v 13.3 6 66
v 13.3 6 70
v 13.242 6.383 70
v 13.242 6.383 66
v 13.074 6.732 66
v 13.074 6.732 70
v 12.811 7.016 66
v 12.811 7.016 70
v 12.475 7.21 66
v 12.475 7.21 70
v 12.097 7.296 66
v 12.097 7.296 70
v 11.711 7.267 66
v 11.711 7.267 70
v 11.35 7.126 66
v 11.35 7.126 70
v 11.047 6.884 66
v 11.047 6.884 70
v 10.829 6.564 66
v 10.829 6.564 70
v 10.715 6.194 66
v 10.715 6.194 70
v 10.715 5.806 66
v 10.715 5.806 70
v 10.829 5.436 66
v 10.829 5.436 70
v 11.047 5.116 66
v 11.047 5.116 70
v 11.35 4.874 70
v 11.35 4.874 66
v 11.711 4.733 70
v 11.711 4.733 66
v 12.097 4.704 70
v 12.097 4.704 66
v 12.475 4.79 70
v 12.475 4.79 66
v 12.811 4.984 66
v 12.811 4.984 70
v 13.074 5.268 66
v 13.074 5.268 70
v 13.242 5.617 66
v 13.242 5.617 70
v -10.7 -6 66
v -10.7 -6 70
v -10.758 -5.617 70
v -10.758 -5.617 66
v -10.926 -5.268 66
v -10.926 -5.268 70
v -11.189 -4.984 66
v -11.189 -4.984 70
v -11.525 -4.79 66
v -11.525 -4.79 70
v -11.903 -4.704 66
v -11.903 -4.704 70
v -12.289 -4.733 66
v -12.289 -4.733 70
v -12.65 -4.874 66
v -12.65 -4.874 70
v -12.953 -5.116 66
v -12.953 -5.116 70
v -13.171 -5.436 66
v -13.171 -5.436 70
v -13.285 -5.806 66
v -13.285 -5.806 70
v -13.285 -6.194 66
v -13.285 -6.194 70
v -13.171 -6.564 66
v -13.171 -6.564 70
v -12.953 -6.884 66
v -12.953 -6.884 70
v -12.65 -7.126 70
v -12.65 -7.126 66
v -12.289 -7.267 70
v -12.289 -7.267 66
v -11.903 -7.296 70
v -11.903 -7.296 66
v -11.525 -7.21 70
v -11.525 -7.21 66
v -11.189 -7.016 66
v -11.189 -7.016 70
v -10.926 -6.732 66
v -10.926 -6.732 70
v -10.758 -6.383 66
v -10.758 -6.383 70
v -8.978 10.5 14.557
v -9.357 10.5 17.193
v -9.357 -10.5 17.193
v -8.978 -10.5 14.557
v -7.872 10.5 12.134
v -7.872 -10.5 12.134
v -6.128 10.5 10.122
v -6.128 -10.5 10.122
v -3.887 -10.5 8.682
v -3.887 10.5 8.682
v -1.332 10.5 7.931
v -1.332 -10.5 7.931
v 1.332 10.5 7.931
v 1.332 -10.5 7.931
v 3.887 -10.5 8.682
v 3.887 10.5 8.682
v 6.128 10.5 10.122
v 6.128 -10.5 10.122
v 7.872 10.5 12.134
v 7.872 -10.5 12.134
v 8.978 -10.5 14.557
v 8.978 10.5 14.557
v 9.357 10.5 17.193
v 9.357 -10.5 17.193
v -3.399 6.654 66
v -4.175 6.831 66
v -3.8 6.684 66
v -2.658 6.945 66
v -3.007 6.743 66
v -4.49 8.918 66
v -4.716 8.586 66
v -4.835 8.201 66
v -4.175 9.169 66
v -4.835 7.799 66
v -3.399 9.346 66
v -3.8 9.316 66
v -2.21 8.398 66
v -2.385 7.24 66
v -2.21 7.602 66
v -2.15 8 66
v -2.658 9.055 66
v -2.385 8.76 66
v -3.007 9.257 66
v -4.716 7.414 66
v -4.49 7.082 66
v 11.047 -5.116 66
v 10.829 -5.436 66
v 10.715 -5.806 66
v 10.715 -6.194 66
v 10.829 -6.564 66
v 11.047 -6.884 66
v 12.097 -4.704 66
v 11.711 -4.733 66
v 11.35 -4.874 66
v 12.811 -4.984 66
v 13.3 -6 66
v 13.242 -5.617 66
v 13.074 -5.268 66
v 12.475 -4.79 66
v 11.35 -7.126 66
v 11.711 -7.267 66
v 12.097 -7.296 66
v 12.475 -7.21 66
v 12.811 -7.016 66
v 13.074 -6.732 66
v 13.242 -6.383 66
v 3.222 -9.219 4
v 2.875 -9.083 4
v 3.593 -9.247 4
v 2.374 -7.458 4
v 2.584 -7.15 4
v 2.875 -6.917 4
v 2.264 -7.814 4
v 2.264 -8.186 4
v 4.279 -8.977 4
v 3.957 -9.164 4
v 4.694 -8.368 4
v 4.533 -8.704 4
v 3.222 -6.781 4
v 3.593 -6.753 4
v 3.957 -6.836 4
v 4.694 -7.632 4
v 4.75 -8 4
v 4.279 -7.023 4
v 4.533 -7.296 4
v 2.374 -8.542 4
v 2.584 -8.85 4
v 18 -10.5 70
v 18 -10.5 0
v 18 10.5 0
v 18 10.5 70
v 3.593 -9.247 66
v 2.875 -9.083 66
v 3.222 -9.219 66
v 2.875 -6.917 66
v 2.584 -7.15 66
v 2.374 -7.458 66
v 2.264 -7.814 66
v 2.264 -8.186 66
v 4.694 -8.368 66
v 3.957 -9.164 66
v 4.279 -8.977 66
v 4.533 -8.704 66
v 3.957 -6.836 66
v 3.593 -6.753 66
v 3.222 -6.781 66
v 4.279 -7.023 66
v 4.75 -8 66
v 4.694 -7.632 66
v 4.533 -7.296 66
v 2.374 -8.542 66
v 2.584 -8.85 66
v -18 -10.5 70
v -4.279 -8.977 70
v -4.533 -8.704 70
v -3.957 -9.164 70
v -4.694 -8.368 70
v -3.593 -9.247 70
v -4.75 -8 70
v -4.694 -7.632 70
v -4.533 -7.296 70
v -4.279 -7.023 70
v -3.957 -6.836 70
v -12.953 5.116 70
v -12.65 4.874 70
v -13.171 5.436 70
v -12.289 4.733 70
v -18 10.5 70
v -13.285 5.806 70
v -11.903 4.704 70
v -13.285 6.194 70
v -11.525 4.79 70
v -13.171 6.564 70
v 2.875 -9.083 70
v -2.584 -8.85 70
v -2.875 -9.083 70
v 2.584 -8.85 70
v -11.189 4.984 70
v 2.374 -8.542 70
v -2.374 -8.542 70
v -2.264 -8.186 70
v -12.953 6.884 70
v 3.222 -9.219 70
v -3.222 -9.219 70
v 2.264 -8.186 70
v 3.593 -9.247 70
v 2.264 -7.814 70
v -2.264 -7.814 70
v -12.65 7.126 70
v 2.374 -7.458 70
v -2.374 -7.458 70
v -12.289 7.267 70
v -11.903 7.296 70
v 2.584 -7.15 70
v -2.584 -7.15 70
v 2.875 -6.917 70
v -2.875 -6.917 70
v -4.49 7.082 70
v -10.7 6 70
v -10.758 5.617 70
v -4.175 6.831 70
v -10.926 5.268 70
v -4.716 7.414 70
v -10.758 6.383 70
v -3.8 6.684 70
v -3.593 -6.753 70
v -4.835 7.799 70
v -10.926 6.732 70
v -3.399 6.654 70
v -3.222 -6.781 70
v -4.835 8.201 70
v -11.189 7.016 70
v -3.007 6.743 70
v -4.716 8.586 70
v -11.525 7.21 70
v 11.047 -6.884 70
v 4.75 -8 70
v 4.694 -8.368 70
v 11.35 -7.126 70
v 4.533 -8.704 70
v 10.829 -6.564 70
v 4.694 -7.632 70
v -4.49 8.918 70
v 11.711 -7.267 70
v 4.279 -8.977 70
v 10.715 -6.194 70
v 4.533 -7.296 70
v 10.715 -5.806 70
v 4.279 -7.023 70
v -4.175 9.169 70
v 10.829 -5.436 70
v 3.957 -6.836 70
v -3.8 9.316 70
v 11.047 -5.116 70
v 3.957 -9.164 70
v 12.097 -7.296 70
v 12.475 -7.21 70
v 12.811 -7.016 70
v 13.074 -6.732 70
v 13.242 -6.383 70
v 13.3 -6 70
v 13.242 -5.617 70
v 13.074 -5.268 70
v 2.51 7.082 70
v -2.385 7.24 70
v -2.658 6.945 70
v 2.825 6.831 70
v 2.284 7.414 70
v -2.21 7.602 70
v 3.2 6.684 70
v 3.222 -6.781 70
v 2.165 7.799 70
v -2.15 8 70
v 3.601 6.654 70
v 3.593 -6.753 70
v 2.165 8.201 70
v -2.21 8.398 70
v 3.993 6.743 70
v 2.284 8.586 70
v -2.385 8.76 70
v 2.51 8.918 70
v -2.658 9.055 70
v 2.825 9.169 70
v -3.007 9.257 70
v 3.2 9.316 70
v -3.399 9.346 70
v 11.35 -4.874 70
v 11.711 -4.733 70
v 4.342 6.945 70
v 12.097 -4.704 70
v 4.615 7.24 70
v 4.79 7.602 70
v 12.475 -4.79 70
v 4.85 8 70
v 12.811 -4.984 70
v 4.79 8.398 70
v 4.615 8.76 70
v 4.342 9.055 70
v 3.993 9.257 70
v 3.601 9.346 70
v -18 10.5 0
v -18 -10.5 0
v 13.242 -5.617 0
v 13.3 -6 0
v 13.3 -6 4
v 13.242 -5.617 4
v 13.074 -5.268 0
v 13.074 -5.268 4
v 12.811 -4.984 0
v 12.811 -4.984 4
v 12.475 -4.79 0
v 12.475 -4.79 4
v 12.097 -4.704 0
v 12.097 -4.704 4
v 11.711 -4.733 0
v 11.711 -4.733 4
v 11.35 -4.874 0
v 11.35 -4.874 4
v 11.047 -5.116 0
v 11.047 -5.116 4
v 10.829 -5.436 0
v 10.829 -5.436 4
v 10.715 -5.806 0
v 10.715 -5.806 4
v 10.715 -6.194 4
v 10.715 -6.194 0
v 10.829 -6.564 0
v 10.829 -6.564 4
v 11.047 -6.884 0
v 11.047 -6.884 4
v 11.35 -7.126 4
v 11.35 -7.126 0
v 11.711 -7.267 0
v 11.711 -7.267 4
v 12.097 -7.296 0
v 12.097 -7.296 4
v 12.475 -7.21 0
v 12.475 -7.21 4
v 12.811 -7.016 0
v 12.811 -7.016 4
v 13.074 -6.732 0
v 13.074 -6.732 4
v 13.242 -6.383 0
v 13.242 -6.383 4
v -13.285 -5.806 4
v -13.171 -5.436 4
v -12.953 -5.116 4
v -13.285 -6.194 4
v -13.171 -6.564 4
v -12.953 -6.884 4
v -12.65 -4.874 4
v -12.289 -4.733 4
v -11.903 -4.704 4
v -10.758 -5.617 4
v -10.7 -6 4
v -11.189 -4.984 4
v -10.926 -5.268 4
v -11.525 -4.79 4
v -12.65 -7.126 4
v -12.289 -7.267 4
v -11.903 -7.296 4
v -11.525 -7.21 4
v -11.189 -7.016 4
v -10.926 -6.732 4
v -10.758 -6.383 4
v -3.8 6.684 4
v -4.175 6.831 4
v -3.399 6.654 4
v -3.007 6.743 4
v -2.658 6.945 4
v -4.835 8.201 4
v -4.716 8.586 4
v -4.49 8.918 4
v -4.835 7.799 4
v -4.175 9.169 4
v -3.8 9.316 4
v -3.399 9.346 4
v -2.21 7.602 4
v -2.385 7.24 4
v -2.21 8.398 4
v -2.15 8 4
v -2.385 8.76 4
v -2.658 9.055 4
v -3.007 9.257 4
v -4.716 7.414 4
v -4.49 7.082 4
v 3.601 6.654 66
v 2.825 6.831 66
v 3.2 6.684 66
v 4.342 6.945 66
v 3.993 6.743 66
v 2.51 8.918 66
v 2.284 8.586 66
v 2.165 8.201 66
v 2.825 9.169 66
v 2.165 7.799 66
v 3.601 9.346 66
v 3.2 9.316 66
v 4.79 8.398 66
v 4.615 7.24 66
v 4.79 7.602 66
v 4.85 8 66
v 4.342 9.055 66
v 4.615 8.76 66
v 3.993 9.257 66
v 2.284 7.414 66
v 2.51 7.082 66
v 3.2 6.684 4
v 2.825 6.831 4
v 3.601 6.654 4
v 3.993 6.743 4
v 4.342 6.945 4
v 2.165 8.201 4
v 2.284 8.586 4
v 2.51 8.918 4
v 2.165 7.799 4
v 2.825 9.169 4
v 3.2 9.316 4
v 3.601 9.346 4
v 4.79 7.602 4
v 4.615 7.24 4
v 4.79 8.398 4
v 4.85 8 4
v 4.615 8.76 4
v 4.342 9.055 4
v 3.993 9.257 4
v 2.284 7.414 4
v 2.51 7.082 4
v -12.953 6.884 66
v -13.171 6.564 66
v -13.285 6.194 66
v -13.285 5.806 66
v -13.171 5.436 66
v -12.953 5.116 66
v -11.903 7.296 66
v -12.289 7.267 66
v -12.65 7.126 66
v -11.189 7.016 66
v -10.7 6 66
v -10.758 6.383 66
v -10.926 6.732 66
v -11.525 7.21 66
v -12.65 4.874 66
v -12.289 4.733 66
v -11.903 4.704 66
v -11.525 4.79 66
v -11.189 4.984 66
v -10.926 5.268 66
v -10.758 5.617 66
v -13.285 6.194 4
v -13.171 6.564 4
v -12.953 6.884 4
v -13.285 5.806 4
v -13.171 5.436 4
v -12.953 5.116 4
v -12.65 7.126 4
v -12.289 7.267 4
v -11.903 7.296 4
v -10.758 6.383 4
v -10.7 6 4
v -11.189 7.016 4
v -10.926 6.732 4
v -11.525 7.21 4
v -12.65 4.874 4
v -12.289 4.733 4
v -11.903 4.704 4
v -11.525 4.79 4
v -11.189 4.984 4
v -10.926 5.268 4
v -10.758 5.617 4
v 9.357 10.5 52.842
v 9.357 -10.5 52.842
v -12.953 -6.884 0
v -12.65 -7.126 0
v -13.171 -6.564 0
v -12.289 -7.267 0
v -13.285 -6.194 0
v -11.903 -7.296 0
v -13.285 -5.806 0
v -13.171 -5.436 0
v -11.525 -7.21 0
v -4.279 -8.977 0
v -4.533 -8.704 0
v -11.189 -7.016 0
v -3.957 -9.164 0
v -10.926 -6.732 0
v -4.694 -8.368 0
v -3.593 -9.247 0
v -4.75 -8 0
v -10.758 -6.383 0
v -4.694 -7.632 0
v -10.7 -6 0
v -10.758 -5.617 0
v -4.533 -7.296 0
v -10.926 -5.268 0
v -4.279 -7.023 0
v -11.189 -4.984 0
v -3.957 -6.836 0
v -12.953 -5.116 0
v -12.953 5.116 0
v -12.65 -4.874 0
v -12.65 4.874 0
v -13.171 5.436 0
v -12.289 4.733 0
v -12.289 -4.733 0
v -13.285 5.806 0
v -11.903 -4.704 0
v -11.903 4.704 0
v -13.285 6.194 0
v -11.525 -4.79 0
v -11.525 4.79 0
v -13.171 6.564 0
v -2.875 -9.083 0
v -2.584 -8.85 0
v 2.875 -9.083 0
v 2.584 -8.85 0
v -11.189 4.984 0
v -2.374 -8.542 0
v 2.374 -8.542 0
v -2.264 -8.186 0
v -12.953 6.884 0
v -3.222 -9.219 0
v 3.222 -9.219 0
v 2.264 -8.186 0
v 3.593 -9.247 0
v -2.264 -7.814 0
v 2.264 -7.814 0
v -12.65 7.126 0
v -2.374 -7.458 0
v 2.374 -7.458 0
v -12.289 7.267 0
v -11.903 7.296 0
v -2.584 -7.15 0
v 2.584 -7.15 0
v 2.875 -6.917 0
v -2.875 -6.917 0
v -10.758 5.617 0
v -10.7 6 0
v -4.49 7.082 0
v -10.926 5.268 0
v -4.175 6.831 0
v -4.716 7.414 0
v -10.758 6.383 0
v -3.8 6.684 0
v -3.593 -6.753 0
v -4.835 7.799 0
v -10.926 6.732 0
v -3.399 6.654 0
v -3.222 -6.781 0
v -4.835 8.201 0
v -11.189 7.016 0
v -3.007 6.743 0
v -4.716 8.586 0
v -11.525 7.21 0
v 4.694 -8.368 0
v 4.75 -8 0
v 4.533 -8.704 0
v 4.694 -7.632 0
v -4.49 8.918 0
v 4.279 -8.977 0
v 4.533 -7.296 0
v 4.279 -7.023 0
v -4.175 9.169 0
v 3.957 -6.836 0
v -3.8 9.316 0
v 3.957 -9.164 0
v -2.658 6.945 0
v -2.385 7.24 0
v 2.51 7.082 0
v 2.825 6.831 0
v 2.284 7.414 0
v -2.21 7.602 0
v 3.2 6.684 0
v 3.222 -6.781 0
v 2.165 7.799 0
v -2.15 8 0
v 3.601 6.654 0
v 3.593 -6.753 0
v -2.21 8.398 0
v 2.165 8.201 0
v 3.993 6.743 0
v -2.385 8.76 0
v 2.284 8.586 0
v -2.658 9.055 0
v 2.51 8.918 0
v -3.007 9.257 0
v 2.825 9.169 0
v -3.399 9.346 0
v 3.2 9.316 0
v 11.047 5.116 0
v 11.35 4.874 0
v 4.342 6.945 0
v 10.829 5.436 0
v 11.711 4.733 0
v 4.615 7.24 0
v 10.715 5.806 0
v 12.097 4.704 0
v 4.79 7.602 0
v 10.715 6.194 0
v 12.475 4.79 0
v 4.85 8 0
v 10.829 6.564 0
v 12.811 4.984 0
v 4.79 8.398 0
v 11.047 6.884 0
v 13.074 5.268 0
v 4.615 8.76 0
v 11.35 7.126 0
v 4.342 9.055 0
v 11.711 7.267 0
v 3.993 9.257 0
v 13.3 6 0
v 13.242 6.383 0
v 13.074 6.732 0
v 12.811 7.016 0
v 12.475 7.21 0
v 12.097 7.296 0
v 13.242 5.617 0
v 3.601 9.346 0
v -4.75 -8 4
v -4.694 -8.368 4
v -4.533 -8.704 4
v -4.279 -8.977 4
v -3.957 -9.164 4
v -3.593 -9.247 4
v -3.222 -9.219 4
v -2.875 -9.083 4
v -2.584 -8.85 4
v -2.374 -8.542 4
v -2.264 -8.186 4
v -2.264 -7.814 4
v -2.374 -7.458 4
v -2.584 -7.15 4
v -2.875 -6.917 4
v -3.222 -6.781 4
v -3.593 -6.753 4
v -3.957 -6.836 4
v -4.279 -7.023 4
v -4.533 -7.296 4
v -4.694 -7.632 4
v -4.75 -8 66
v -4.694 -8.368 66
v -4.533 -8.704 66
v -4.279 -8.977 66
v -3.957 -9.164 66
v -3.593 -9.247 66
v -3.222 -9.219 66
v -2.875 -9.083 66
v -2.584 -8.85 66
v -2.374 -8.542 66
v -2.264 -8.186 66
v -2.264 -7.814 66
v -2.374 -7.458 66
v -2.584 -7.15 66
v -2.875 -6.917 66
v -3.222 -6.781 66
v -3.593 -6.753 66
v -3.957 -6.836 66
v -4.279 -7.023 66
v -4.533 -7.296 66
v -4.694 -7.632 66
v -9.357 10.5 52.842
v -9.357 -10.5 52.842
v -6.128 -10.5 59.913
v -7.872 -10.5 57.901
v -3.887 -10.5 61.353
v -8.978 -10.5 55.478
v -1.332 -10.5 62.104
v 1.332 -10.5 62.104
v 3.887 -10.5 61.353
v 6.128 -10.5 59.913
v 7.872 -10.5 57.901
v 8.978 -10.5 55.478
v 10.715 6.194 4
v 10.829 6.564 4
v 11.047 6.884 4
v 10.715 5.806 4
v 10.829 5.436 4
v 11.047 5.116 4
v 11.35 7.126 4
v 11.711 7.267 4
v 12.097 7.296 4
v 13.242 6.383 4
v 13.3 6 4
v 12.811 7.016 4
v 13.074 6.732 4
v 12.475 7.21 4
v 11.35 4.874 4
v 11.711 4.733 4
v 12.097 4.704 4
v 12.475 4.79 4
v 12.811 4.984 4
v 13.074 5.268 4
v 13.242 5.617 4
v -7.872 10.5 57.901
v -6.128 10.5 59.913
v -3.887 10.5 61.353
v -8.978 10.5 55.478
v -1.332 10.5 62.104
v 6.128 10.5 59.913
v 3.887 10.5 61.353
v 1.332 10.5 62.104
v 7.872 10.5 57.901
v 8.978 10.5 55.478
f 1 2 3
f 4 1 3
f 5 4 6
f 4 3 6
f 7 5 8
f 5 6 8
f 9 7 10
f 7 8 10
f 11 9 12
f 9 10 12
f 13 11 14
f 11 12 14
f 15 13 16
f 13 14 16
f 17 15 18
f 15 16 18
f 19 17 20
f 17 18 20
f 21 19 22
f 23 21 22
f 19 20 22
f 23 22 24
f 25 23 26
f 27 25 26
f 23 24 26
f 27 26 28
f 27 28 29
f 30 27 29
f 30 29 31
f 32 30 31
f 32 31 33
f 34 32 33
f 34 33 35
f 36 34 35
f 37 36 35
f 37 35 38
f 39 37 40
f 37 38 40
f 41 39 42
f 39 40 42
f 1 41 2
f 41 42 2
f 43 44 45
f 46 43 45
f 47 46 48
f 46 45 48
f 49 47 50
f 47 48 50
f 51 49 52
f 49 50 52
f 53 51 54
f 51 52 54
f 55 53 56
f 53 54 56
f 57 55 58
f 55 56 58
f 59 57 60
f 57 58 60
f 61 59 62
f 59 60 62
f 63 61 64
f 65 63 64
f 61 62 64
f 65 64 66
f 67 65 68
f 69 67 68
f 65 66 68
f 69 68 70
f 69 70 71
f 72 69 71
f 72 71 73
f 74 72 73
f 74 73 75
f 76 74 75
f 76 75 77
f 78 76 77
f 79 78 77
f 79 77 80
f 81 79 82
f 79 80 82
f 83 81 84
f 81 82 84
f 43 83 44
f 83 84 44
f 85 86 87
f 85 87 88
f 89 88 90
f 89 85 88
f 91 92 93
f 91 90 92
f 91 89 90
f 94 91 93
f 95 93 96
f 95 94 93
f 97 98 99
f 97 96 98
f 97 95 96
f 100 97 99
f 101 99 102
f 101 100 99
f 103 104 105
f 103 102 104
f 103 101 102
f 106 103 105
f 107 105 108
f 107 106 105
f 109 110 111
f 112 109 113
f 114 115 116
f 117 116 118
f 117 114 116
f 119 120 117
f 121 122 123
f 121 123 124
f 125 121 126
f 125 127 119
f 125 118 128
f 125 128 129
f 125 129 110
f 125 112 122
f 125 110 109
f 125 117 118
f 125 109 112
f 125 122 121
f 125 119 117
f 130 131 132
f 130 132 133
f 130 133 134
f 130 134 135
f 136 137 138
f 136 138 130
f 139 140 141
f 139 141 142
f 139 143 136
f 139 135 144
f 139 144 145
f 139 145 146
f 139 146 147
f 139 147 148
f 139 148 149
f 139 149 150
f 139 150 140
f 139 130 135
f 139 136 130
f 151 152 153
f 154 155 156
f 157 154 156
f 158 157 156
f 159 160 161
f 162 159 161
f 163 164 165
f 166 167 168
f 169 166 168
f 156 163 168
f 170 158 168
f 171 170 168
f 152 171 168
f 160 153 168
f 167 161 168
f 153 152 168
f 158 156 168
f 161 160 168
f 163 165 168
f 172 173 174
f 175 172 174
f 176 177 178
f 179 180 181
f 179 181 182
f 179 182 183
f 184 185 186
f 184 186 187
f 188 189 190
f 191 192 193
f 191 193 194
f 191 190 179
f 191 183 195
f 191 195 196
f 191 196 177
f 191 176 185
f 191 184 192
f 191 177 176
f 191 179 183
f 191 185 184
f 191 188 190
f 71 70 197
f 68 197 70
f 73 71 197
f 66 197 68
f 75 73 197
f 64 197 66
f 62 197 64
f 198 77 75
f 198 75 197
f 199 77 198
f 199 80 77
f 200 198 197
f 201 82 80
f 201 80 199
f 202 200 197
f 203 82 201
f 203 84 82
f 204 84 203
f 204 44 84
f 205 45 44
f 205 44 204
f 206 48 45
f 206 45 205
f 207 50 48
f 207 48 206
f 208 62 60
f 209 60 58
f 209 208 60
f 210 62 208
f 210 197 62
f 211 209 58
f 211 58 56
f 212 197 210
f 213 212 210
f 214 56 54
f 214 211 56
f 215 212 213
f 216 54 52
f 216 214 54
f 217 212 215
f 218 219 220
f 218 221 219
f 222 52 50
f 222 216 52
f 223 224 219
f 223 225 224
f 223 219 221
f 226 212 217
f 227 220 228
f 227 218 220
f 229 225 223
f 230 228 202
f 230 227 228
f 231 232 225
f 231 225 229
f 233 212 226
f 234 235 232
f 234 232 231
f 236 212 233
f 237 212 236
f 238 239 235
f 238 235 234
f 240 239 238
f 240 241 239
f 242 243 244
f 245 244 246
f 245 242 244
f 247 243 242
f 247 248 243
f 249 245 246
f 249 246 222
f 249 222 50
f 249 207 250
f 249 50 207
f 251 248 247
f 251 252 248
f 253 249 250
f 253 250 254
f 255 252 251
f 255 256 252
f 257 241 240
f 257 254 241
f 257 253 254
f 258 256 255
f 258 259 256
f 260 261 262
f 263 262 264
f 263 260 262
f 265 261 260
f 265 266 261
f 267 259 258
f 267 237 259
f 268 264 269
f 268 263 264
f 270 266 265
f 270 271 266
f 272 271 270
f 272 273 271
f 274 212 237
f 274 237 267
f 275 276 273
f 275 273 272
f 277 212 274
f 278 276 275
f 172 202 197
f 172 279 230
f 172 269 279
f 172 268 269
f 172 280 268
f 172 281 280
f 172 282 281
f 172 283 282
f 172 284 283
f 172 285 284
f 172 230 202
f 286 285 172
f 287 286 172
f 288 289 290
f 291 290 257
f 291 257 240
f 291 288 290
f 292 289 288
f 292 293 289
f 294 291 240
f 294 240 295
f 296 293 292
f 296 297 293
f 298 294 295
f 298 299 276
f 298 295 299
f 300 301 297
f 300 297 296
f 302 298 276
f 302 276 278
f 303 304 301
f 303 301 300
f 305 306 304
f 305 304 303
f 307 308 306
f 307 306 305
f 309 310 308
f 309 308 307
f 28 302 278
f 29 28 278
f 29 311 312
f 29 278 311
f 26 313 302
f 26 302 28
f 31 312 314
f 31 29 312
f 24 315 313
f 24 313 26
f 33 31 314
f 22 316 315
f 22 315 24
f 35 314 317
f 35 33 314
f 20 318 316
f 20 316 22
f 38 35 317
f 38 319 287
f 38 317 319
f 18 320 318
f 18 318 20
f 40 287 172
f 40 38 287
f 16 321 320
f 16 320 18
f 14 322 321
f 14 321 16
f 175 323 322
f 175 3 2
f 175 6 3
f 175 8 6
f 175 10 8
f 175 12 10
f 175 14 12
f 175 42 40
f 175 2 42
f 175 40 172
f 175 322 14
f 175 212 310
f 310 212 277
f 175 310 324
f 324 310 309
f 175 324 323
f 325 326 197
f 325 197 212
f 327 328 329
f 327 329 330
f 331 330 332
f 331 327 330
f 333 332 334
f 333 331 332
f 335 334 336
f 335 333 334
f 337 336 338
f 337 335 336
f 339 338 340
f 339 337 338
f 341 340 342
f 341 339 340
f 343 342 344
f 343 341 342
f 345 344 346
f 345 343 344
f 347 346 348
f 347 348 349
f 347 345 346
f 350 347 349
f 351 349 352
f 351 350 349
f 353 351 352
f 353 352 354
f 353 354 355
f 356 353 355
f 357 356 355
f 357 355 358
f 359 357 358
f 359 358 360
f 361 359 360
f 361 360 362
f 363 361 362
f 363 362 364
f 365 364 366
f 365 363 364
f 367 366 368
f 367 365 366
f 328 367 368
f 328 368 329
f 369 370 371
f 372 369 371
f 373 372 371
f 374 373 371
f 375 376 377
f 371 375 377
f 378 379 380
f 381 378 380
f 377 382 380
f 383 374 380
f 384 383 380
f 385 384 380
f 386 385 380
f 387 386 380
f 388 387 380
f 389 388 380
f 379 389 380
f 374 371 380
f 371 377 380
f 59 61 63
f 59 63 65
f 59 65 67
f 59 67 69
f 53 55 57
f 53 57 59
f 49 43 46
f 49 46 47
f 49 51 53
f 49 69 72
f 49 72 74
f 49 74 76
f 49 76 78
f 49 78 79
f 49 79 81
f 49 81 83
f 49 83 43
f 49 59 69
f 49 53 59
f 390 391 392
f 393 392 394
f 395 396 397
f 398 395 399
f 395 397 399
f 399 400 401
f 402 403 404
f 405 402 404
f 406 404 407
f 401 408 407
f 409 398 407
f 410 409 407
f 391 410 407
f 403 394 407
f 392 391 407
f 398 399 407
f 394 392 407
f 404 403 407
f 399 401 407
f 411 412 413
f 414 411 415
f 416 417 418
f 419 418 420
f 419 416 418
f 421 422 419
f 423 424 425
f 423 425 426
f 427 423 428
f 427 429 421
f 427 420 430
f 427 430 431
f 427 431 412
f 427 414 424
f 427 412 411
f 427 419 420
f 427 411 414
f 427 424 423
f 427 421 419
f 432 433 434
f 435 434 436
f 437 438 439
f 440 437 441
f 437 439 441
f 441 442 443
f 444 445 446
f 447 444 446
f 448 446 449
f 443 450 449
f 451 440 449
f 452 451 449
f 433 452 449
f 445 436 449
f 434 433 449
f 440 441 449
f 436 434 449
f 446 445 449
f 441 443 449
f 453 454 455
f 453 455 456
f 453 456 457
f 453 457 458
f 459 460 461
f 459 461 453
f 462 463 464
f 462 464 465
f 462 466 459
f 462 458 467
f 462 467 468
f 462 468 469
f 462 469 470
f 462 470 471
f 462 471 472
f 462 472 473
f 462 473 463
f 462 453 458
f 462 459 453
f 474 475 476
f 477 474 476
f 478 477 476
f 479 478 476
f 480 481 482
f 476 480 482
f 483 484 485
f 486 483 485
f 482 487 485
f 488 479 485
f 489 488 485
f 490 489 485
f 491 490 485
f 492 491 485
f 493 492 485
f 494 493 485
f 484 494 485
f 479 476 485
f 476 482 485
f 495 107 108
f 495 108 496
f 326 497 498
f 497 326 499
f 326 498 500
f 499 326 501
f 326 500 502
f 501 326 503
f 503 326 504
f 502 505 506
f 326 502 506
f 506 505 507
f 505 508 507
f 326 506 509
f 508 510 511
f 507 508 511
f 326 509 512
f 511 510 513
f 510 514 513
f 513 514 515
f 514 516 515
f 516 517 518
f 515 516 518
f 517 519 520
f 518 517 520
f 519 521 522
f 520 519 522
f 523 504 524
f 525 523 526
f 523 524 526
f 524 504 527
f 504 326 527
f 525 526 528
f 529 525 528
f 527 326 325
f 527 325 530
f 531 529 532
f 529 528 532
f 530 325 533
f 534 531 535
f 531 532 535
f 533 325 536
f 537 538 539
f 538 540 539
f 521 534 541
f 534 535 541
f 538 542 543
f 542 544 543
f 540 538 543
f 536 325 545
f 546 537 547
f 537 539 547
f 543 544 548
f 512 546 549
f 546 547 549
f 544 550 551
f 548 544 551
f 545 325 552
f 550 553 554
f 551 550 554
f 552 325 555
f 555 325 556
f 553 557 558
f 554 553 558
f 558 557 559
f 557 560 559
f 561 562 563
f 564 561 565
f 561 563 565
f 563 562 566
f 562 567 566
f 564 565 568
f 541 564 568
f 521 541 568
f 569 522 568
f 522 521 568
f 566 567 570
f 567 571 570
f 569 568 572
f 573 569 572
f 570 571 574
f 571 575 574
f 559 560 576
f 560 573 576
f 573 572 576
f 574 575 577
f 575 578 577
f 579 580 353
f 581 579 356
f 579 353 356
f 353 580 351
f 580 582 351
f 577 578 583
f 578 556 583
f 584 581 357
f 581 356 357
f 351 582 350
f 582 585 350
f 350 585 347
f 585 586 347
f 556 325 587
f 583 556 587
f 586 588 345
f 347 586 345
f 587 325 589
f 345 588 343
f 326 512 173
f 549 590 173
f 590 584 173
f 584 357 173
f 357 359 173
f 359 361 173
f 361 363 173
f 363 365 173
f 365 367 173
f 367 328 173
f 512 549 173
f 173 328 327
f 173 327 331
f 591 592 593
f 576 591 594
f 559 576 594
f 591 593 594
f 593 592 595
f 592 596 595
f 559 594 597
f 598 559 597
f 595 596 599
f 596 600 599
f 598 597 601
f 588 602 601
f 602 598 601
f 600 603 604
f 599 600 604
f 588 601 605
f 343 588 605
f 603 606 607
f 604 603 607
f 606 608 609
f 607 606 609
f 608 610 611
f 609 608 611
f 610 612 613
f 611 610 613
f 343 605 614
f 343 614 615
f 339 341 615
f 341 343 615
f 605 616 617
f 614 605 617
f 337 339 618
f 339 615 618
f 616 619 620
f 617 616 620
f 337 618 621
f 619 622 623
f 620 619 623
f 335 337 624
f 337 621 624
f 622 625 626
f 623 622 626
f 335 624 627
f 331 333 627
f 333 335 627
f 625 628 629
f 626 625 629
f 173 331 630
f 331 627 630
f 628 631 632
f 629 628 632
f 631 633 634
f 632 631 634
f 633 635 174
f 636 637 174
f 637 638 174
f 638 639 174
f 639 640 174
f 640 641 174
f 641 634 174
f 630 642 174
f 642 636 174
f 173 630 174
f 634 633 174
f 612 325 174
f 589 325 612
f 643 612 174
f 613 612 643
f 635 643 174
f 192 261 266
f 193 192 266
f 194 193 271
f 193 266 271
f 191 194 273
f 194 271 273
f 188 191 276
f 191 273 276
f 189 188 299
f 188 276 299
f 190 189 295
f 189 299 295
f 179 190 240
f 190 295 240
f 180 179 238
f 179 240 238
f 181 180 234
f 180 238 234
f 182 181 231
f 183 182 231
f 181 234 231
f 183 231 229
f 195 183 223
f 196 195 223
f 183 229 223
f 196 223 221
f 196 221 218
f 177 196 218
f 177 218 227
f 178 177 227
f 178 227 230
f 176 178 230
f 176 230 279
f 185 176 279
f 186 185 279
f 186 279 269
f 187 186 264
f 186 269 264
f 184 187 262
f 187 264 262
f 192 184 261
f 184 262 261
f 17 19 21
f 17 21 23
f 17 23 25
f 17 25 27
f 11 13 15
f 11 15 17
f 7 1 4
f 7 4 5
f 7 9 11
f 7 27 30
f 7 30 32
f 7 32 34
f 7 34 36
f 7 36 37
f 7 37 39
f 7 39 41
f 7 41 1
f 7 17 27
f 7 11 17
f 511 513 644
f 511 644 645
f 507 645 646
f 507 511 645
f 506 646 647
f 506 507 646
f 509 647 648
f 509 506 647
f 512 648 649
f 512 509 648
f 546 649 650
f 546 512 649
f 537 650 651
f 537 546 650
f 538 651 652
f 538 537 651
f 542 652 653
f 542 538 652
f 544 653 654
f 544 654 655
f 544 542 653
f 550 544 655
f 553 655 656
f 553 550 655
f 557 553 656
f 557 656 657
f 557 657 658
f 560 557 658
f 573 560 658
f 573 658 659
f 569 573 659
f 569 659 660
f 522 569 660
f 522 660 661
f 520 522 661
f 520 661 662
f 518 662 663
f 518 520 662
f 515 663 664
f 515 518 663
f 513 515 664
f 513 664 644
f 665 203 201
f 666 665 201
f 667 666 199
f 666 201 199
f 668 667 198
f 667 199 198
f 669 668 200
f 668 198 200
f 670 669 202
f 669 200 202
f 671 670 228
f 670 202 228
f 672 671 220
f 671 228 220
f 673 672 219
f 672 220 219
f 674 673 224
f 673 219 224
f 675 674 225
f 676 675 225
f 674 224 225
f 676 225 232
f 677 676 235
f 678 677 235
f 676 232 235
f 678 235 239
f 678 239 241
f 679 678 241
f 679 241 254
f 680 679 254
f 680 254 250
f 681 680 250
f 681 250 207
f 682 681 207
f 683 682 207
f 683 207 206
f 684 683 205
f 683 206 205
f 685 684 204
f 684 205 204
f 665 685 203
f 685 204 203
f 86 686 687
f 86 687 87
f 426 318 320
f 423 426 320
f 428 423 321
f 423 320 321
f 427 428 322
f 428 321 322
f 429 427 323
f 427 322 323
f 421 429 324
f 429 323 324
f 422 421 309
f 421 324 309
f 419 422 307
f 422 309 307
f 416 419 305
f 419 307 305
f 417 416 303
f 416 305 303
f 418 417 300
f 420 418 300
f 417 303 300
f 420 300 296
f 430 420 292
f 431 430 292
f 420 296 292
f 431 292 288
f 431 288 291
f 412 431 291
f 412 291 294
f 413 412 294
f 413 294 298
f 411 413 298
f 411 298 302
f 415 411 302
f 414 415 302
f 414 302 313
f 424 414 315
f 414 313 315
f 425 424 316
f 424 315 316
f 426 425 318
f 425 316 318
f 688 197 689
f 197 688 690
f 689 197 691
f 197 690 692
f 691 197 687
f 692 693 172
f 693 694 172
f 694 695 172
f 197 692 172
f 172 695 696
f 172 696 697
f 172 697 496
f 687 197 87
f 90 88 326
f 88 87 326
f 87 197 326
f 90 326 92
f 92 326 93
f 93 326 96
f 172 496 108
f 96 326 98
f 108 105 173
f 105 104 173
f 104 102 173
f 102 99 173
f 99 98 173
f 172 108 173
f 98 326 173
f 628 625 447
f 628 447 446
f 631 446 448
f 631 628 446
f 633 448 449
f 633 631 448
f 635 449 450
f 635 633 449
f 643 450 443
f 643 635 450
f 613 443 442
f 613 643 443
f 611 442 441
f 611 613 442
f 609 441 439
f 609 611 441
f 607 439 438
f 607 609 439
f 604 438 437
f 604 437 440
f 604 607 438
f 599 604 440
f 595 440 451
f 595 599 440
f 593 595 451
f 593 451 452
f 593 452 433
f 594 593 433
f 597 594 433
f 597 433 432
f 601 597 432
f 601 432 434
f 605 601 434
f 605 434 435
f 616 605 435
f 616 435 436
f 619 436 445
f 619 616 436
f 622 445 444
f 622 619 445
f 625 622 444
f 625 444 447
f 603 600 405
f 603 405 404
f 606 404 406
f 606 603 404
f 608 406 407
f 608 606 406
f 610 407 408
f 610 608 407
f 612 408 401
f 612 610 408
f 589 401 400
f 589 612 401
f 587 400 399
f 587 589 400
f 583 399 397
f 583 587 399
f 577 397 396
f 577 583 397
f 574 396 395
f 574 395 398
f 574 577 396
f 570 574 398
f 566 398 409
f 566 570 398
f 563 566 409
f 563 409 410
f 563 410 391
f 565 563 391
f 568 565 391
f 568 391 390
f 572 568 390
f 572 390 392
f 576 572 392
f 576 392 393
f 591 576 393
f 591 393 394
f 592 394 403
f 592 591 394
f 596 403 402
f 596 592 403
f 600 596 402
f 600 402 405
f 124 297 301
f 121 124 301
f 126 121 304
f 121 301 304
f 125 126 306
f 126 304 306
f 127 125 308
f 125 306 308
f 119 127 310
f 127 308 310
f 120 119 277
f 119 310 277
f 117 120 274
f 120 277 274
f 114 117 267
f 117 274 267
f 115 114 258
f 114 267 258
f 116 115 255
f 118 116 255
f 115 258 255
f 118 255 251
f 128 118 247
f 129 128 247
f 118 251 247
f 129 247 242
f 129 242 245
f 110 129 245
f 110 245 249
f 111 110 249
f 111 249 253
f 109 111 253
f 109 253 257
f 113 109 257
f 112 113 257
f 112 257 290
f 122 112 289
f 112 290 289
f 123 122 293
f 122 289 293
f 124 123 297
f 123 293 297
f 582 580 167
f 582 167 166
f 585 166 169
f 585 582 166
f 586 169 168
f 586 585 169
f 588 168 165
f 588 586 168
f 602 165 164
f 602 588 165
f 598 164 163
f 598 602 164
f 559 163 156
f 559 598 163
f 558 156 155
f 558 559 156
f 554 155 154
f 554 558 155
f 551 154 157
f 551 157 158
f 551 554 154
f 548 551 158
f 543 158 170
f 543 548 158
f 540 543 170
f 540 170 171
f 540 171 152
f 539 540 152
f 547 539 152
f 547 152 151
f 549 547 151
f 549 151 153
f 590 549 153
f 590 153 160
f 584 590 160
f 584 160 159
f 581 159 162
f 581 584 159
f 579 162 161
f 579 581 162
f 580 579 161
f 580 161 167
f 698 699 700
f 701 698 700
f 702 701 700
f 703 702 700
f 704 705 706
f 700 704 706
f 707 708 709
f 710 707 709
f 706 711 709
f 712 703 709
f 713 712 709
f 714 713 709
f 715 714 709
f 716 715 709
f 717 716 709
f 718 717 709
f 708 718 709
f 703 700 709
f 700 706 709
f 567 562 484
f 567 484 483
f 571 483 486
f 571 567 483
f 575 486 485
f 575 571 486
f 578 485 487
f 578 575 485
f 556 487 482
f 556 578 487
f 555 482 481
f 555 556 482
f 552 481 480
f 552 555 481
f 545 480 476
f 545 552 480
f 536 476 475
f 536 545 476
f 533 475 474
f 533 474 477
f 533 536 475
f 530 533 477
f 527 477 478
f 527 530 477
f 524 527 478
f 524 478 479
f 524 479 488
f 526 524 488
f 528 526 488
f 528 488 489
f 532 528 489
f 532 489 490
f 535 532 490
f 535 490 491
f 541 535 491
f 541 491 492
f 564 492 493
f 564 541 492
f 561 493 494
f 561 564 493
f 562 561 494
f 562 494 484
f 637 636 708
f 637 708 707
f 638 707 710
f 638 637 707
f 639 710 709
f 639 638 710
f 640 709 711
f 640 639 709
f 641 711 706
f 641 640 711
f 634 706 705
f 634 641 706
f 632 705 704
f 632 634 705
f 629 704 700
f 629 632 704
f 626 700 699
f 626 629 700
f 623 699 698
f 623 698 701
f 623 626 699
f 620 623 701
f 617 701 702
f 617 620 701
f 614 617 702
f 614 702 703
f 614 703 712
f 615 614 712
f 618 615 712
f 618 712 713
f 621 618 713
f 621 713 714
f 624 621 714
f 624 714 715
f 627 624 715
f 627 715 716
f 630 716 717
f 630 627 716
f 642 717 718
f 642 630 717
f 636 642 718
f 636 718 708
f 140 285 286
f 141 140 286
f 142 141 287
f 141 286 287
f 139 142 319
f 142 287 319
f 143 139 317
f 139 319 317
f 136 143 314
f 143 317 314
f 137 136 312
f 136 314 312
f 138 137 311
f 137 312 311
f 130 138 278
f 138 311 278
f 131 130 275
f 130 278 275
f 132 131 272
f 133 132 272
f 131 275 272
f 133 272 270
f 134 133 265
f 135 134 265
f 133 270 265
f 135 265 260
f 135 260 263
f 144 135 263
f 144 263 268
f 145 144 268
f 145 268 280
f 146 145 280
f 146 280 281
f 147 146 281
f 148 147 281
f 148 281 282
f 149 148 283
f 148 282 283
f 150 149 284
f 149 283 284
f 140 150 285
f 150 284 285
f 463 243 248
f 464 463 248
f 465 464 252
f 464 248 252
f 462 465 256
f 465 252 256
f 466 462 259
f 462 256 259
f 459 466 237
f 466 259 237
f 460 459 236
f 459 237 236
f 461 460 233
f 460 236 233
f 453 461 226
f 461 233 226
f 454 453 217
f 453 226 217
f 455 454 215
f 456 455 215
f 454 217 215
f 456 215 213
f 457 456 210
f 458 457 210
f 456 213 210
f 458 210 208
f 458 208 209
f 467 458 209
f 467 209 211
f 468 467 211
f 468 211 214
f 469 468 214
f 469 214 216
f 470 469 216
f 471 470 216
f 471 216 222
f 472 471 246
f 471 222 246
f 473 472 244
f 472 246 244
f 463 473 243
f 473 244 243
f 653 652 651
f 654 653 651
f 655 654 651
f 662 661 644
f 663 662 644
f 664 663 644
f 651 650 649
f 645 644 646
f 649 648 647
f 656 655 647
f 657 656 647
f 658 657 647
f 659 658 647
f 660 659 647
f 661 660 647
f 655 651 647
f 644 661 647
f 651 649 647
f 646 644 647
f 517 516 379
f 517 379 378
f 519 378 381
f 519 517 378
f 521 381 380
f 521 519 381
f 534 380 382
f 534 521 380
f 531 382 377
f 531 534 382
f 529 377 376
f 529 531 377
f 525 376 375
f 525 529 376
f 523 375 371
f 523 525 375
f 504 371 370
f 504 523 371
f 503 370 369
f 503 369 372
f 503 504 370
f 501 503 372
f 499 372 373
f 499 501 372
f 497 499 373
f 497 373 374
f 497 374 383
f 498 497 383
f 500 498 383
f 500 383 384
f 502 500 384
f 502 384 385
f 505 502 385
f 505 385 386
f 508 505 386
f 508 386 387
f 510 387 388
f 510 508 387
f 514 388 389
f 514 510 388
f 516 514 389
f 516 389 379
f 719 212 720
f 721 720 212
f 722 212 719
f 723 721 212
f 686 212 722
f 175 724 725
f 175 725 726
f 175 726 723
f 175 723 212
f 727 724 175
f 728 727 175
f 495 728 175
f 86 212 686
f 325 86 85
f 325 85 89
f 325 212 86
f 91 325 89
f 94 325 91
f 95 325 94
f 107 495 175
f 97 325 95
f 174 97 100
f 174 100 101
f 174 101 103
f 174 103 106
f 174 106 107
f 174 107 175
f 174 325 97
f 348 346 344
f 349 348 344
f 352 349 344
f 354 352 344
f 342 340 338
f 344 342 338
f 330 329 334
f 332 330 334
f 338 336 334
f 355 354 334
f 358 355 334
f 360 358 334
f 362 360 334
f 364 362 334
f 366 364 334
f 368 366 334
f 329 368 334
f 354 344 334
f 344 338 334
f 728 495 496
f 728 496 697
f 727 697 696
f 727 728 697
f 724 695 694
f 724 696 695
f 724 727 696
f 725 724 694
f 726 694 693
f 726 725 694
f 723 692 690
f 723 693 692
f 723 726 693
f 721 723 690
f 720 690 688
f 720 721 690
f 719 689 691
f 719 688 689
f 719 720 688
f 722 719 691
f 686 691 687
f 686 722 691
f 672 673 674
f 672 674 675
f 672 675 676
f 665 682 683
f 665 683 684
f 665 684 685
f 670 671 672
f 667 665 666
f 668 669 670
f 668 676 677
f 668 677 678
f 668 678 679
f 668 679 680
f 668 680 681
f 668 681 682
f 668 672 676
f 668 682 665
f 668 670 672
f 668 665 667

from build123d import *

# Parameters (mm, degrees)
SKETCH_1_W          = 36
SKETCH_1_H          = 21
SKETCH_1_R          = 1.25
SKETCH_1_R_2        = 1.3
SKETCH_1_R_3        = 1.35
EXTRUDE_1_DEPTH     = 70
SKETCH_1_5_R        = 1.3
SKETCH_1_5_R_2      = 1.35
SKETCH_1_5_R_3      = 1.25
CUT_EXTRUDE_1_DEPTH = 4
CUT_EXTRUDE_START   = 70
SKETCH_1_6_R        = 1.35
SKETCH_1_6_R_2      = 1.3
SKETCH_1_6_R_3      = 1.25
CUT_EXTRUDE_2_DEPTH = 4
CUT_EXTRUDE1_DEPTH  = 30


with BuildPart() as part:
    # 스케치1 → 보스-돌출1 (new body)
    with BuildSketch(Plane.XY):
        Rectangle(SKETCH_1_W, SKETCH_1_H)
        with Locations((-3.5, -8)):
            Circle(SKETCH_1_R, mode=Mode.SUBTRACT)
        with Locations((3.5, -8)):
            Circle(SKETCH_1_R, mode=Mode.SUBTRACT)
        with Locations((-12, 6)):
            Circle(SKETCH_1_R_2, mode=Mode.SUBTRACT)
        with Locations((12, 6)):
            Circle(SKETCH_1_R_2, mode=Mode.SUBTRACT)
        with Locations((12, -6)):
            Circle(SKETCH_1_R_2, mode=Mode.SUBTRACT)
        with Locations((-12, -6)):
            Circle(SKETCH_1_R_2, mode=Mode.SUBTRACT)
        with Locations((3.5, 8)):
            Circle(SKETCH_1_R_3, mode=Mode.SUBTRACT)
        with Locations((-3.5, 8)):
            Circle(SKETCH_1_R_3, mode=Mode.SUBTRACT)
        with Locations((12, -6)):
            Circle(SKETCH_1_R_2)
        with Locations((3.5, -8)):
            Circle(SKETCH_1_R)
        with Locations((-3.5, -8)):
            Circle(SKETCH_1_R)
        with Locations((-12, -6)):
            Circle(SKETCH_1_R_2)
        with Locations((-12, 6)):
            Circle(SKETCH_1_R_2)
        with Locations((-3.5, 8)):
            Circle(SKETCH_1_R_3)
        with Locations((3.5, 8)):
            Circle(SKETCH_1_R_3)
        with Locations((12, 6)):
            Circle(SKETCH_1_R_2)
    extrude(amount=EXTRUDE_1_DEPTH)

    # 스케치1<5> → 컷-돌출1 (cut)
    with BuildSketch(Plane.XY):
        with Locations((12, 6)):
            Circle(SKETCH_1_5_R)
        with Locations((3.5, 8)):
            Circle(SKETCH_1_5_R_2)
        with Locations((-3.5, 8)):
            Circle(SKETCH_1_5_R_2)
        with Locations((-12, 6)):
            Circle(SKETCH_1_5_R)
        with Locations((-12, -6)):
            Circle(SKETCH_1_5_R)
        with Locations(Location((-3.5, -8, 0), (0, 0, 180))):
            Circle(SKETCH_1_5_R_3)
        with Locations((3.5, -8)):
            Circle(SKETCH_1_5_R_3)
        with Locations((12, -6)):
            Circle(SKETCH_1_5_R)
    extrude(amount=CUT_EXTRUDE_1_DEPTH, mode=Mode.SUBTRACT)

    # 스케치1<6> → 컷-돌출2 (cut)
    with BuildSketch(Plane.XY.offset(CUT_EXTRUDE_START)):
        with Locations((3.5, 8)):
            Circle(SKETCH_1_6_R)
        with Locations((12, 6)):
            Circle(SKETCH_1_6_R_2)
        with Locations((-3.5, 8)):
            Circle(SKETCH_1_6_R)
        with Locations((-12, 6)):
            Circle(SKETCH_1_6_R_2)
        with Locations((-12, -6)):
            Circle(SKETCH_1_6_R_2)
        with Locations(Location((-3.5, -8, 0), (0, 0, 180))):
            Circle(SKETCH_1_6_R_3)
        with Locations((3.5, -8)):
            Circle(SKETCH_1_6_R_3)
        with Locations((12, -6)):
            Circle(SKETCH_1_6_R_2)
    extrude(amount=-CUT_EXTRUDE_2_DEPTH, mode=Mode.SUBTRACT)

    # Sketch1 → Cut-Extrude1 (cut)
    with BuildSketch(Plane(origin=(0, 10.5, 0), x_dir=(1, 0, 0), z_dir=(0, 1, 0))):
        with BuildLine():
            Line((9.357060489, -17.19326846), (9.357060489, -52.841694339))
            ThreePointArc((9.357060489, -52.841694339), (0, -62.198754828), (-9.357060489, -52.841694339))
            Line((-9.357060489, -52.841694339), (-9.357060489, -17.19326846))
            ThreePointArc((-9.357060489, -17.19326846), (0, -7.836207971), (9.357060489, -17.19326846))
        make_face()
    extrude(amount=-CUT_EXTRUDE1_DEPTH, mode=Mode.SUBTRACT)


solid = part.part
